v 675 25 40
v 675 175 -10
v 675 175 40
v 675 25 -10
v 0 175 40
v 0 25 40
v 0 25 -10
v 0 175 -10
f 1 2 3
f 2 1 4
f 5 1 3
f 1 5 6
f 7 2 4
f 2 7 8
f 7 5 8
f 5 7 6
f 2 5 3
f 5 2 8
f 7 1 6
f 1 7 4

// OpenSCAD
difference(){
translate([0,25,-10])
cube([675,150,50]);
linear_extrude(file = "nuvodia_plain.dxf", height = 40);
translate([0,0,10])
linear_extrude(file = "nuvodia_o.dxf", height = 30);
}
